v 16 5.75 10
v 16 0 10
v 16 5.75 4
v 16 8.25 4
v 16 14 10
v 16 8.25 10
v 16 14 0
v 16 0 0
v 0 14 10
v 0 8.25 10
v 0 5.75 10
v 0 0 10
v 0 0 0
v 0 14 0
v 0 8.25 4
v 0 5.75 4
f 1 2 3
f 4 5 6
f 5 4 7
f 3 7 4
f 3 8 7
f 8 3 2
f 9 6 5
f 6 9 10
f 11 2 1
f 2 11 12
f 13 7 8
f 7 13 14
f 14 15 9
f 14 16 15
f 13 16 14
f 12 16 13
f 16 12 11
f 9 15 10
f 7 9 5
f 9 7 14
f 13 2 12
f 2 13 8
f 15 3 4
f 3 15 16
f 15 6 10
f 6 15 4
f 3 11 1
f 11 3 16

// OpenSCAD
$fn = 32;

// ----------------------------------------------------------------------
// Micro clip: slotted block, 5-20 mm class
// ----------------------------------------------------------------------

// --- parameters (mm) ---
block_l = 16;             // block length, X
block_w = 14;             // block width, Y
block_h = 10;             // block height, Z
slot_w = 2.5;             // slot width
slot_d = 6;               // slot depth from the top

difference() {
  cube([block_l, block_w, block_h]);
  translate([-1, block_w / 2 - slot_w / 2, block_h - slot_d])
    cube([block_l + 2, slot_w, slot_d + 1]);
}
